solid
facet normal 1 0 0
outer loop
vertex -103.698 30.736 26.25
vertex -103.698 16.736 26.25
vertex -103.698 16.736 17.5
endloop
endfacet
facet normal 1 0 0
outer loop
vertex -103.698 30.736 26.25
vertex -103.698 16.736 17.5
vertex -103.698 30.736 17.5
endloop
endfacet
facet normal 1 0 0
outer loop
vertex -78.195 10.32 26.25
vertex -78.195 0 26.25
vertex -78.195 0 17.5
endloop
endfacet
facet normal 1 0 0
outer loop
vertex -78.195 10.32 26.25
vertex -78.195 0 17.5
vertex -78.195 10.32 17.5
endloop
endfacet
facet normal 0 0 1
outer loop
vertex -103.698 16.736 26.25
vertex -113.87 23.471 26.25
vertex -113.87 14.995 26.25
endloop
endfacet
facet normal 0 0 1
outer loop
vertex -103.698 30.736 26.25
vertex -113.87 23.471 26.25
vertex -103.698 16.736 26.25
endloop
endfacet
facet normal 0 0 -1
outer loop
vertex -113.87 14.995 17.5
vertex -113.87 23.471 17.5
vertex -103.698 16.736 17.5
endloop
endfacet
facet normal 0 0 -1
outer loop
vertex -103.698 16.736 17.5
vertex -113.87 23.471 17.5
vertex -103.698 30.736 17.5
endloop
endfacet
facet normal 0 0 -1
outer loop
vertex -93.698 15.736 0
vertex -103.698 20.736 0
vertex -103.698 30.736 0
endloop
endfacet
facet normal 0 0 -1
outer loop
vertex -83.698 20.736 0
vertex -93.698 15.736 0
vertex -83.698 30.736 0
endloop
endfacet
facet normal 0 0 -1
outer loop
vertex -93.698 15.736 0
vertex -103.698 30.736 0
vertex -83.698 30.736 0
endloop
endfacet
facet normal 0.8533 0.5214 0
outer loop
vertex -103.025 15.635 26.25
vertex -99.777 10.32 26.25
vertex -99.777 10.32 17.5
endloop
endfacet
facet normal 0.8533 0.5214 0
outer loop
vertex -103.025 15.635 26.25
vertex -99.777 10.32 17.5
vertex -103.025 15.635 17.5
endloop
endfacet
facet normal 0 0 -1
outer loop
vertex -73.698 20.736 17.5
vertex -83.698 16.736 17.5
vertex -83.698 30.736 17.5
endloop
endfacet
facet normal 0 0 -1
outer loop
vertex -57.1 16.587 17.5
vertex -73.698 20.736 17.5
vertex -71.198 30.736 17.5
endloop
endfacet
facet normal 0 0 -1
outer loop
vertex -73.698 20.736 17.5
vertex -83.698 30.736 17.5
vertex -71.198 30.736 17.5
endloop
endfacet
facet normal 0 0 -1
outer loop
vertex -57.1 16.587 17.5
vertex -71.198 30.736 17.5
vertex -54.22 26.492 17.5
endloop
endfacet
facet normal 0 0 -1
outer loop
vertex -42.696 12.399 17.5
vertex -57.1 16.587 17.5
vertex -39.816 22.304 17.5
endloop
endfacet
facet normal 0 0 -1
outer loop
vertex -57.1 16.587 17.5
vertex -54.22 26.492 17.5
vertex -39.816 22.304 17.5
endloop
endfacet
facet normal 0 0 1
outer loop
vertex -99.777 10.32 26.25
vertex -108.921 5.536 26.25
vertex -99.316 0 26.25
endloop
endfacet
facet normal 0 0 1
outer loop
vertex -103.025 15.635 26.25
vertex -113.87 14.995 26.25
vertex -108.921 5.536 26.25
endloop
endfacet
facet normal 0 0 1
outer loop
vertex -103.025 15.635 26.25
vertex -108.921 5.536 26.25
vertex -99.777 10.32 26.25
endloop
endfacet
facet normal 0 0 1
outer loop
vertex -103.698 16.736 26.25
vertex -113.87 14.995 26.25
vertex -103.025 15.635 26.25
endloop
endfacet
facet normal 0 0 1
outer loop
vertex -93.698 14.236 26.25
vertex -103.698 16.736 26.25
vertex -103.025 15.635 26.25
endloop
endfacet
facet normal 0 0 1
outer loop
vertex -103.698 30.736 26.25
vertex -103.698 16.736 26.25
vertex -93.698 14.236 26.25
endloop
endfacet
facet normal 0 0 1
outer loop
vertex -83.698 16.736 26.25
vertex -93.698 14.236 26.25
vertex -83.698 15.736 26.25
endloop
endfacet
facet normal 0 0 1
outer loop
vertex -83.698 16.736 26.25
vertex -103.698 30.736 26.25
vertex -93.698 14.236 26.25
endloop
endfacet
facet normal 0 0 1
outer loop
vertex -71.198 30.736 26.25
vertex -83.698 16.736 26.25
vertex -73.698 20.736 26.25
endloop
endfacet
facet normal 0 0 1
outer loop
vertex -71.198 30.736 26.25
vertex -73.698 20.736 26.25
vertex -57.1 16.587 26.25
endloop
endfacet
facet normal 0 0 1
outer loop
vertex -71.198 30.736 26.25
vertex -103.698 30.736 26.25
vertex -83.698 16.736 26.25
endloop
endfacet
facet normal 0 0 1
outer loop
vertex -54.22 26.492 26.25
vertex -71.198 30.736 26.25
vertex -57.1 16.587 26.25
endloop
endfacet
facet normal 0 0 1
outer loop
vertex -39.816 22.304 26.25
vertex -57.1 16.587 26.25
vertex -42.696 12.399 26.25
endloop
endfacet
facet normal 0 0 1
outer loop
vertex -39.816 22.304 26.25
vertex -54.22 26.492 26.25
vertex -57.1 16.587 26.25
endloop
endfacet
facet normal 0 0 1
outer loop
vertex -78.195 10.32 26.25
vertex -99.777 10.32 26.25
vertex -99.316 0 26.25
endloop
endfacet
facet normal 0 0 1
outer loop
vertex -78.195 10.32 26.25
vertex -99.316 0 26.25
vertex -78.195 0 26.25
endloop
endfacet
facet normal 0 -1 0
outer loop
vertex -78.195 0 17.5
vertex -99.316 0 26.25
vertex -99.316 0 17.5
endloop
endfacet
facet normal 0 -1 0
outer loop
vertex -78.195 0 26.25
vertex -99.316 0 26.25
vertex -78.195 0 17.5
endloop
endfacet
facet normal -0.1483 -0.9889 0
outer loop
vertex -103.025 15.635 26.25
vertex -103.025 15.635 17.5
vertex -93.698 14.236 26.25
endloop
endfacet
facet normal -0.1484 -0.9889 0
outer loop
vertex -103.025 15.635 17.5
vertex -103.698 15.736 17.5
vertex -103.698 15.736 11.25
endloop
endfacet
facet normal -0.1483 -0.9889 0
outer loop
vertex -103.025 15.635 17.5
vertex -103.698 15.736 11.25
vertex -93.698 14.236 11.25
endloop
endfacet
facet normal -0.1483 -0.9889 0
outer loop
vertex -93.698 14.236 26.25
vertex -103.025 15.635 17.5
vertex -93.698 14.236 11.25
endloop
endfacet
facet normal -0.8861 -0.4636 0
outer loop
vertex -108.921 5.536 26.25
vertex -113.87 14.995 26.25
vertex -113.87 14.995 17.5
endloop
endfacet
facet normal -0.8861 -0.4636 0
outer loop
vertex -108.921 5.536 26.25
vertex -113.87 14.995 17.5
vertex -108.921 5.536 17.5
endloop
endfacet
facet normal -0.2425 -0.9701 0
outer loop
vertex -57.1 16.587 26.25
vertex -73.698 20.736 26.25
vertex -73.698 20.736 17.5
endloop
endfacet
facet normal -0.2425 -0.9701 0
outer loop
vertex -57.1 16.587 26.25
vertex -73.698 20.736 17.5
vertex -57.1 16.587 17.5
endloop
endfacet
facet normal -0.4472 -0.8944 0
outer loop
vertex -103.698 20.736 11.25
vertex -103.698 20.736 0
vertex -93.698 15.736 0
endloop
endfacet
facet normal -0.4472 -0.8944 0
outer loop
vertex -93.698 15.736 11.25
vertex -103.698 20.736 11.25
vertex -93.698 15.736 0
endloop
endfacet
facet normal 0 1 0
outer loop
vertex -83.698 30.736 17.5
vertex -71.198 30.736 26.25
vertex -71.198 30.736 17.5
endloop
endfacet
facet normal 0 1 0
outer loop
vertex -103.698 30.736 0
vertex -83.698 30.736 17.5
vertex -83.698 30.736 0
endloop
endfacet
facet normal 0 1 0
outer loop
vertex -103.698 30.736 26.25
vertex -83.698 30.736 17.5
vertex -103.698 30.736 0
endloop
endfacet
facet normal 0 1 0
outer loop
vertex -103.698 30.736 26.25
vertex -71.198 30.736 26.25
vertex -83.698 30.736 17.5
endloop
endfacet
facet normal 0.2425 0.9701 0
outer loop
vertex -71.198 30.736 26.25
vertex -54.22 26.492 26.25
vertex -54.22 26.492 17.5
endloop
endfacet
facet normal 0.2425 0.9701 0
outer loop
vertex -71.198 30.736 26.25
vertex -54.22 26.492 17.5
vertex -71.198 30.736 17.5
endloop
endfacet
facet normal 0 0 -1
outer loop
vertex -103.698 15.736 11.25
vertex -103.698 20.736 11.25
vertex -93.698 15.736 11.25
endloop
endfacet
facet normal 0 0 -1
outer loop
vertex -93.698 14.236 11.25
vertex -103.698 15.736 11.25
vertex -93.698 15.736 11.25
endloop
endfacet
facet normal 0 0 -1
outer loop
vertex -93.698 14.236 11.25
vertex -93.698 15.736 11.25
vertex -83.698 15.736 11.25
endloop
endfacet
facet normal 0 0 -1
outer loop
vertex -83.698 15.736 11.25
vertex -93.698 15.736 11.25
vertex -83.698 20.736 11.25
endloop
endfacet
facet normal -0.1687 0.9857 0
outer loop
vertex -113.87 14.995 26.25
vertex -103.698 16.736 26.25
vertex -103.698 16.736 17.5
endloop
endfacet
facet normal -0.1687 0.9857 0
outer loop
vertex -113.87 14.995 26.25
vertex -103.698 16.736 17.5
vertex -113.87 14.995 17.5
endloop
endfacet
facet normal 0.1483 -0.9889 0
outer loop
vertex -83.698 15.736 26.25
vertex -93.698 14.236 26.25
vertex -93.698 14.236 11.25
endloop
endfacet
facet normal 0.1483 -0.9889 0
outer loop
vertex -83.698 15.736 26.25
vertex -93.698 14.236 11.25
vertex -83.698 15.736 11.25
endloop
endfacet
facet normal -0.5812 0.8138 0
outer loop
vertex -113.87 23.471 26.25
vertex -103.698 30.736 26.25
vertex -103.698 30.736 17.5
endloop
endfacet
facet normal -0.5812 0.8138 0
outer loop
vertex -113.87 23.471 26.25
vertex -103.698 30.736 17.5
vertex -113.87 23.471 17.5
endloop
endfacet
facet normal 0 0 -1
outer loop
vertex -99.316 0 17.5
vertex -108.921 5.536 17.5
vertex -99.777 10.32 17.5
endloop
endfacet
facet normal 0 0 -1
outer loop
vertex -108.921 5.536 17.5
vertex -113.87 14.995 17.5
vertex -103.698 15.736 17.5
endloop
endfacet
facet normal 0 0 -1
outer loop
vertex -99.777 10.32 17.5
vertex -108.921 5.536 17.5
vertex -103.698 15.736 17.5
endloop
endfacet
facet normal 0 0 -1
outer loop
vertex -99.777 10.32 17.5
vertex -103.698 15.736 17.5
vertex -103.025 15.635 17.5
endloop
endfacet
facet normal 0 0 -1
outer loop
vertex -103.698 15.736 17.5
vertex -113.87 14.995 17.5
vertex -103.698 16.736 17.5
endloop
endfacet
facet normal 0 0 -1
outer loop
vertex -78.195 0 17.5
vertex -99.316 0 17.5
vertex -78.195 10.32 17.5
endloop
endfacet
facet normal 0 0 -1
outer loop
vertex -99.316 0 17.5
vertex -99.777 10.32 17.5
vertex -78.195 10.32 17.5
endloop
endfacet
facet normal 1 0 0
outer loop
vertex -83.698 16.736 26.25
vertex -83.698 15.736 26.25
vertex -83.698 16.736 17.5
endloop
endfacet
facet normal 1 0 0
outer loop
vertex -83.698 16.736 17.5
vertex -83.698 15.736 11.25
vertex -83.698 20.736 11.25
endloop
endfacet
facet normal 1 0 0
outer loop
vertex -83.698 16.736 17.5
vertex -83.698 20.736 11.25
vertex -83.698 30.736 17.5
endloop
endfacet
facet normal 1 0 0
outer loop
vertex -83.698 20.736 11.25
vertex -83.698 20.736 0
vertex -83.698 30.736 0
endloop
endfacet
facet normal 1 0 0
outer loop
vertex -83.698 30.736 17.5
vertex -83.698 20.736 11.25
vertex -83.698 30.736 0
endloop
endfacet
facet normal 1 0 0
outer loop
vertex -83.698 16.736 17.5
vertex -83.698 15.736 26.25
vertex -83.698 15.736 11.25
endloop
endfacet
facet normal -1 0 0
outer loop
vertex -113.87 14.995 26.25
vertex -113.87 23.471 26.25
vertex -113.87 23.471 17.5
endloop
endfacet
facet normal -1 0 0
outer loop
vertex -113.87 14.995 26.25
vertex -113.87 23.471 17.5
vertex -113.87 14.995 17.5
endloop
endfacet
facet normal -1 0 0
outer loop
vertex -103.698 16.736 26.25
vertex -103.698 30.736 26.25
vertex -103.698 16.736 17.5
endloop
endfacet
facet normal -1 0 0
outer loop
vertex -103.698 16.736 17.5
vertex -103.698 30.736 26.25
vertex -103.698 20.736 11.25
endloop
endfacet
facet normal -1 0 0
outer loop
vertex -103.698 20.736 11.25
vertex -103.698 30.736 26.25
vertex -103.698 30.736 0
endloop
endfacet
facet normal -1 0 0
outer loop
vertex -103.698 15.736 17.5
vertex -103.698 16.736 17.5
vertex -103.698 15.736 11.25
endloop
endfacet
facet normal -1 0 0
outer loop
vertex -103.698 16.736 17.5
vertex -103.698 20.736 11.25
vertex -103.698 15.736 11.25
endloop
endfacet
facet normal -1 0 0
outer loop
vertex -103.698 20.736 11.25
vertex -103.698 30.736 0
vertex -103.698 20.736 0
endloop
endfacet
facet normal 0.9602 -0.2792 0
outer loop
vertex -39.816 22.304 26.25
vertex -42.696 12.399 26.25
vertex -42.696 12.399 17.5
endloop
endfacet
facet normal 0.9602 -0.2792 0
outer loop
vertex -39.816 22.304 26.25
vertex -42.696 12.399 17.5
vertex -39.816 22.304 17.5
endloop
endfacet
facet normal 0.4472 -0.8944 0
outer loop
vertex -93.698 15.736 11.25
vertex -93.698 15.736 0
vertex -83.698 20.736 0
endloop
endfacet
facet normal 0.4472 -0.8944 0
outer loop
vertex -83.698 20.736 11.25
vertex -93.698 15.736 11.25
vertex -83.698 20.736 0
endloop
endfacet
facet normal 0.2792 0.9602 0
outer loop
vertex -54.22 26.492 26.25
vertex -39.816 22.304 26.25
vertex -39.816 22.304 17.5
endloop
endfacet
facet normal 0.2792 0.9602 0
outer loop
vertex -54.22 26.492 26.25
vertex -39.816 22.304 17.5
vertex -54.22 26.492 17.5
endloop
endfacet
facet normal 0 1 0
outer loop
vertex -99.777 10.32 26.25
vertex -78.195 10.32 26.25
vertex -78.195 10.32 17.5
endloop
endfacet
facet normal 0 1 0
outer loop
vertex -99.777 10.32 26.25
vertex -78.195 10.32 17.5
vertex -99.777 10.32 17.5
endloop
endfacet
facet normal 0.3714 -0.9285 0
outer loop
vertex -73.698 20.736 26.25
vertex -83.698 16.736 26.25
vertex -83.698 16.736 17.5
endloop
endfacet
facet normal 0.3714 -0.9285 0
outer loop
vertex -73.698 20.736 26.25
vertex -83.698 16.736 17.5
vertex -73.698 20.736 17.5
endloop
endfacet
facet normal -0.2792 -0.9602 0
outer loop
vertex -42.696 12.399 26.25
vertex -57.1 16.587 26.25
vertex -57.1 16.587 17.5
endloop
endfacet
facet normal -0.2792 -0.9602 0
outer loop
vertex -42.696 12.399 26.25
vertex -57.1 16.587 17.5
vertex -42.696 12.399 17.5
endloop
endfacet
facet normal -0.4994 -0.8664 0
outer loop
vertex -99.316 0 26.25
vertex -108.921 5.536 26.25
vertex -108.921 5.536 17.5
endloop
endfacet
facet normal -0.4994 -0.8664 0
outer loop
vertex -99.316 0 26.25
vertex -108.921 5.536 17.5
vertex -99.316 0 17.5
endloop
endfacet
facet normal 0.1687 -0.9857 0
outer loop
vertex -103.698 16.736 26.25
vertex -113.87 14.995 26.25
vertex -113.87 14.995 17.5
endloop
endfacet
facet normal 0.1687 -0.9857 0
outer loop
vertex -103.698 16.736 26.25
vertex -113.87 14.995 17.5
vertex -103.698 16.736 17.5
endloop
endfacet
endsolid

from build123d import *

# Parameters (mm, degrees)
F1_DEPTH  = 11.25
F3_DEPTH  = 15
F5_DEPTH  = 8.75
F7_DEPTH  = 8.75
F9_DEPTH  = 8.75
F11_DEPTH = 8.75
F13_DEPTH = 8.75


with BuildPart() as f1:
    # F0 (on Top) → F1 (new body)
    with BuildSketch(Plane.XY):
        Polygon((-83.697603792, 30.7361355424), (-93.697603792, 30.7361355424), (-93.697603792, 15.7361355424), (-83.697603792, 20.7361355424), align=None)
        Polygon((-93.697603792, 30.7361355424), (-103.697603792, 30.7361355424), (-103.697603792, 20.7361355424), (-93.697603792, 15.7361355424), align=None)
    extrude(amount=F1_DEPTH)

    # F2 (on face) → F3 (join)
    with BuildSketch(Plane.XY.offset(11.25)):
        Polygon((-93.697603792, 15.7361355424), (-103.697603792, 20.7361355424), (-103.697603792, 15.7361355424), (-93.697603792, 14.2361355424), align=None)
        Polygon((-93.697603792, 30.7361355424), (-103.697603792, 30.7361355424), (-103.697603792, 20.7361355424), (-93.697603792, 15.7361355424), align=None)
        Polygon((-83.697603792, 20.7361355424), (-93.697603792, 15.7361355424), (-93.697603792, 14.2361355424), (-83.697603792, 15.7361355424), align=None)
        Polygon((-83.697603792, 30.7361355424), (-93.697603792, 30.7361355424), (-93.697603792, 15.7361355424), (-83.697603792, 20.7361355424), align=None)
    extrude(amount=F3_DEPTH)

    # F4 (on face) → F5 (join)
    with BuildSketch(Plane.XY.offset(26.25)):
        Polygon((-71.197603792, 30.7361355424), (-83.697603792, 30.7361355424), (-83.697603792, 16.7361355424), (-73.697603792, 20.7361355424), align=None)
    extrude(amount=-F5_DEPTH)

    # F8 (on face) → F9 (join)
    with BuildSketch(Plane.XY.offset(26.25)):
        Polygon((-71.197603792, 30.7361355424), (-73.697603792, 20.7361355424), (-57.0997293118, 16.5866669224), (-54.2201100394, 26.4917621043), align=None)
    extrude(amount=-F9_DEPTH)

    # F10 (on face) → F11 (join)
    with BuildSketch(Plane.XY.offset(26.25)):
        Polygon((-103.697603792, 16.7361355424), (-113.8697295168, 14.9953718484), (-108.9211053768, 5.5361545759), (-99.3160009384, 0), (-78.1948640943, 0), (-78.1948640943, 10.32), (-99.7768600302, 10.32), align=None)
    extrude(amount=-F11_DEPTH)

    # F12 (on face) → F13 (join)
    with BuildSketch(Plane.XY.offset(26.25)):
        Polygon((-54.2201100394, 26.4917621043), (-57.0997293118, 16.5866669224), (-42.6960734807, 12.3992215558), (-39.8164542083, 22.3043167377), align=None)
    extrude(amount=-F13_DEPTH)


with BuildPart() as f7:
    # F6 (on face) → F7 (new body)
    with BuildSketch(Plane.XY.offset(26.25)):
        Polygon((-103.697603792, 16.7361355424), (-103.697603792, 30.7361355424), (-113.8697295168, 23.4712984321), (-113.8697295168, 14.9953718484), align=None)
    extrude(amount=-F7_DEPTH)


solid = Compound([f1.part, f7.part])
